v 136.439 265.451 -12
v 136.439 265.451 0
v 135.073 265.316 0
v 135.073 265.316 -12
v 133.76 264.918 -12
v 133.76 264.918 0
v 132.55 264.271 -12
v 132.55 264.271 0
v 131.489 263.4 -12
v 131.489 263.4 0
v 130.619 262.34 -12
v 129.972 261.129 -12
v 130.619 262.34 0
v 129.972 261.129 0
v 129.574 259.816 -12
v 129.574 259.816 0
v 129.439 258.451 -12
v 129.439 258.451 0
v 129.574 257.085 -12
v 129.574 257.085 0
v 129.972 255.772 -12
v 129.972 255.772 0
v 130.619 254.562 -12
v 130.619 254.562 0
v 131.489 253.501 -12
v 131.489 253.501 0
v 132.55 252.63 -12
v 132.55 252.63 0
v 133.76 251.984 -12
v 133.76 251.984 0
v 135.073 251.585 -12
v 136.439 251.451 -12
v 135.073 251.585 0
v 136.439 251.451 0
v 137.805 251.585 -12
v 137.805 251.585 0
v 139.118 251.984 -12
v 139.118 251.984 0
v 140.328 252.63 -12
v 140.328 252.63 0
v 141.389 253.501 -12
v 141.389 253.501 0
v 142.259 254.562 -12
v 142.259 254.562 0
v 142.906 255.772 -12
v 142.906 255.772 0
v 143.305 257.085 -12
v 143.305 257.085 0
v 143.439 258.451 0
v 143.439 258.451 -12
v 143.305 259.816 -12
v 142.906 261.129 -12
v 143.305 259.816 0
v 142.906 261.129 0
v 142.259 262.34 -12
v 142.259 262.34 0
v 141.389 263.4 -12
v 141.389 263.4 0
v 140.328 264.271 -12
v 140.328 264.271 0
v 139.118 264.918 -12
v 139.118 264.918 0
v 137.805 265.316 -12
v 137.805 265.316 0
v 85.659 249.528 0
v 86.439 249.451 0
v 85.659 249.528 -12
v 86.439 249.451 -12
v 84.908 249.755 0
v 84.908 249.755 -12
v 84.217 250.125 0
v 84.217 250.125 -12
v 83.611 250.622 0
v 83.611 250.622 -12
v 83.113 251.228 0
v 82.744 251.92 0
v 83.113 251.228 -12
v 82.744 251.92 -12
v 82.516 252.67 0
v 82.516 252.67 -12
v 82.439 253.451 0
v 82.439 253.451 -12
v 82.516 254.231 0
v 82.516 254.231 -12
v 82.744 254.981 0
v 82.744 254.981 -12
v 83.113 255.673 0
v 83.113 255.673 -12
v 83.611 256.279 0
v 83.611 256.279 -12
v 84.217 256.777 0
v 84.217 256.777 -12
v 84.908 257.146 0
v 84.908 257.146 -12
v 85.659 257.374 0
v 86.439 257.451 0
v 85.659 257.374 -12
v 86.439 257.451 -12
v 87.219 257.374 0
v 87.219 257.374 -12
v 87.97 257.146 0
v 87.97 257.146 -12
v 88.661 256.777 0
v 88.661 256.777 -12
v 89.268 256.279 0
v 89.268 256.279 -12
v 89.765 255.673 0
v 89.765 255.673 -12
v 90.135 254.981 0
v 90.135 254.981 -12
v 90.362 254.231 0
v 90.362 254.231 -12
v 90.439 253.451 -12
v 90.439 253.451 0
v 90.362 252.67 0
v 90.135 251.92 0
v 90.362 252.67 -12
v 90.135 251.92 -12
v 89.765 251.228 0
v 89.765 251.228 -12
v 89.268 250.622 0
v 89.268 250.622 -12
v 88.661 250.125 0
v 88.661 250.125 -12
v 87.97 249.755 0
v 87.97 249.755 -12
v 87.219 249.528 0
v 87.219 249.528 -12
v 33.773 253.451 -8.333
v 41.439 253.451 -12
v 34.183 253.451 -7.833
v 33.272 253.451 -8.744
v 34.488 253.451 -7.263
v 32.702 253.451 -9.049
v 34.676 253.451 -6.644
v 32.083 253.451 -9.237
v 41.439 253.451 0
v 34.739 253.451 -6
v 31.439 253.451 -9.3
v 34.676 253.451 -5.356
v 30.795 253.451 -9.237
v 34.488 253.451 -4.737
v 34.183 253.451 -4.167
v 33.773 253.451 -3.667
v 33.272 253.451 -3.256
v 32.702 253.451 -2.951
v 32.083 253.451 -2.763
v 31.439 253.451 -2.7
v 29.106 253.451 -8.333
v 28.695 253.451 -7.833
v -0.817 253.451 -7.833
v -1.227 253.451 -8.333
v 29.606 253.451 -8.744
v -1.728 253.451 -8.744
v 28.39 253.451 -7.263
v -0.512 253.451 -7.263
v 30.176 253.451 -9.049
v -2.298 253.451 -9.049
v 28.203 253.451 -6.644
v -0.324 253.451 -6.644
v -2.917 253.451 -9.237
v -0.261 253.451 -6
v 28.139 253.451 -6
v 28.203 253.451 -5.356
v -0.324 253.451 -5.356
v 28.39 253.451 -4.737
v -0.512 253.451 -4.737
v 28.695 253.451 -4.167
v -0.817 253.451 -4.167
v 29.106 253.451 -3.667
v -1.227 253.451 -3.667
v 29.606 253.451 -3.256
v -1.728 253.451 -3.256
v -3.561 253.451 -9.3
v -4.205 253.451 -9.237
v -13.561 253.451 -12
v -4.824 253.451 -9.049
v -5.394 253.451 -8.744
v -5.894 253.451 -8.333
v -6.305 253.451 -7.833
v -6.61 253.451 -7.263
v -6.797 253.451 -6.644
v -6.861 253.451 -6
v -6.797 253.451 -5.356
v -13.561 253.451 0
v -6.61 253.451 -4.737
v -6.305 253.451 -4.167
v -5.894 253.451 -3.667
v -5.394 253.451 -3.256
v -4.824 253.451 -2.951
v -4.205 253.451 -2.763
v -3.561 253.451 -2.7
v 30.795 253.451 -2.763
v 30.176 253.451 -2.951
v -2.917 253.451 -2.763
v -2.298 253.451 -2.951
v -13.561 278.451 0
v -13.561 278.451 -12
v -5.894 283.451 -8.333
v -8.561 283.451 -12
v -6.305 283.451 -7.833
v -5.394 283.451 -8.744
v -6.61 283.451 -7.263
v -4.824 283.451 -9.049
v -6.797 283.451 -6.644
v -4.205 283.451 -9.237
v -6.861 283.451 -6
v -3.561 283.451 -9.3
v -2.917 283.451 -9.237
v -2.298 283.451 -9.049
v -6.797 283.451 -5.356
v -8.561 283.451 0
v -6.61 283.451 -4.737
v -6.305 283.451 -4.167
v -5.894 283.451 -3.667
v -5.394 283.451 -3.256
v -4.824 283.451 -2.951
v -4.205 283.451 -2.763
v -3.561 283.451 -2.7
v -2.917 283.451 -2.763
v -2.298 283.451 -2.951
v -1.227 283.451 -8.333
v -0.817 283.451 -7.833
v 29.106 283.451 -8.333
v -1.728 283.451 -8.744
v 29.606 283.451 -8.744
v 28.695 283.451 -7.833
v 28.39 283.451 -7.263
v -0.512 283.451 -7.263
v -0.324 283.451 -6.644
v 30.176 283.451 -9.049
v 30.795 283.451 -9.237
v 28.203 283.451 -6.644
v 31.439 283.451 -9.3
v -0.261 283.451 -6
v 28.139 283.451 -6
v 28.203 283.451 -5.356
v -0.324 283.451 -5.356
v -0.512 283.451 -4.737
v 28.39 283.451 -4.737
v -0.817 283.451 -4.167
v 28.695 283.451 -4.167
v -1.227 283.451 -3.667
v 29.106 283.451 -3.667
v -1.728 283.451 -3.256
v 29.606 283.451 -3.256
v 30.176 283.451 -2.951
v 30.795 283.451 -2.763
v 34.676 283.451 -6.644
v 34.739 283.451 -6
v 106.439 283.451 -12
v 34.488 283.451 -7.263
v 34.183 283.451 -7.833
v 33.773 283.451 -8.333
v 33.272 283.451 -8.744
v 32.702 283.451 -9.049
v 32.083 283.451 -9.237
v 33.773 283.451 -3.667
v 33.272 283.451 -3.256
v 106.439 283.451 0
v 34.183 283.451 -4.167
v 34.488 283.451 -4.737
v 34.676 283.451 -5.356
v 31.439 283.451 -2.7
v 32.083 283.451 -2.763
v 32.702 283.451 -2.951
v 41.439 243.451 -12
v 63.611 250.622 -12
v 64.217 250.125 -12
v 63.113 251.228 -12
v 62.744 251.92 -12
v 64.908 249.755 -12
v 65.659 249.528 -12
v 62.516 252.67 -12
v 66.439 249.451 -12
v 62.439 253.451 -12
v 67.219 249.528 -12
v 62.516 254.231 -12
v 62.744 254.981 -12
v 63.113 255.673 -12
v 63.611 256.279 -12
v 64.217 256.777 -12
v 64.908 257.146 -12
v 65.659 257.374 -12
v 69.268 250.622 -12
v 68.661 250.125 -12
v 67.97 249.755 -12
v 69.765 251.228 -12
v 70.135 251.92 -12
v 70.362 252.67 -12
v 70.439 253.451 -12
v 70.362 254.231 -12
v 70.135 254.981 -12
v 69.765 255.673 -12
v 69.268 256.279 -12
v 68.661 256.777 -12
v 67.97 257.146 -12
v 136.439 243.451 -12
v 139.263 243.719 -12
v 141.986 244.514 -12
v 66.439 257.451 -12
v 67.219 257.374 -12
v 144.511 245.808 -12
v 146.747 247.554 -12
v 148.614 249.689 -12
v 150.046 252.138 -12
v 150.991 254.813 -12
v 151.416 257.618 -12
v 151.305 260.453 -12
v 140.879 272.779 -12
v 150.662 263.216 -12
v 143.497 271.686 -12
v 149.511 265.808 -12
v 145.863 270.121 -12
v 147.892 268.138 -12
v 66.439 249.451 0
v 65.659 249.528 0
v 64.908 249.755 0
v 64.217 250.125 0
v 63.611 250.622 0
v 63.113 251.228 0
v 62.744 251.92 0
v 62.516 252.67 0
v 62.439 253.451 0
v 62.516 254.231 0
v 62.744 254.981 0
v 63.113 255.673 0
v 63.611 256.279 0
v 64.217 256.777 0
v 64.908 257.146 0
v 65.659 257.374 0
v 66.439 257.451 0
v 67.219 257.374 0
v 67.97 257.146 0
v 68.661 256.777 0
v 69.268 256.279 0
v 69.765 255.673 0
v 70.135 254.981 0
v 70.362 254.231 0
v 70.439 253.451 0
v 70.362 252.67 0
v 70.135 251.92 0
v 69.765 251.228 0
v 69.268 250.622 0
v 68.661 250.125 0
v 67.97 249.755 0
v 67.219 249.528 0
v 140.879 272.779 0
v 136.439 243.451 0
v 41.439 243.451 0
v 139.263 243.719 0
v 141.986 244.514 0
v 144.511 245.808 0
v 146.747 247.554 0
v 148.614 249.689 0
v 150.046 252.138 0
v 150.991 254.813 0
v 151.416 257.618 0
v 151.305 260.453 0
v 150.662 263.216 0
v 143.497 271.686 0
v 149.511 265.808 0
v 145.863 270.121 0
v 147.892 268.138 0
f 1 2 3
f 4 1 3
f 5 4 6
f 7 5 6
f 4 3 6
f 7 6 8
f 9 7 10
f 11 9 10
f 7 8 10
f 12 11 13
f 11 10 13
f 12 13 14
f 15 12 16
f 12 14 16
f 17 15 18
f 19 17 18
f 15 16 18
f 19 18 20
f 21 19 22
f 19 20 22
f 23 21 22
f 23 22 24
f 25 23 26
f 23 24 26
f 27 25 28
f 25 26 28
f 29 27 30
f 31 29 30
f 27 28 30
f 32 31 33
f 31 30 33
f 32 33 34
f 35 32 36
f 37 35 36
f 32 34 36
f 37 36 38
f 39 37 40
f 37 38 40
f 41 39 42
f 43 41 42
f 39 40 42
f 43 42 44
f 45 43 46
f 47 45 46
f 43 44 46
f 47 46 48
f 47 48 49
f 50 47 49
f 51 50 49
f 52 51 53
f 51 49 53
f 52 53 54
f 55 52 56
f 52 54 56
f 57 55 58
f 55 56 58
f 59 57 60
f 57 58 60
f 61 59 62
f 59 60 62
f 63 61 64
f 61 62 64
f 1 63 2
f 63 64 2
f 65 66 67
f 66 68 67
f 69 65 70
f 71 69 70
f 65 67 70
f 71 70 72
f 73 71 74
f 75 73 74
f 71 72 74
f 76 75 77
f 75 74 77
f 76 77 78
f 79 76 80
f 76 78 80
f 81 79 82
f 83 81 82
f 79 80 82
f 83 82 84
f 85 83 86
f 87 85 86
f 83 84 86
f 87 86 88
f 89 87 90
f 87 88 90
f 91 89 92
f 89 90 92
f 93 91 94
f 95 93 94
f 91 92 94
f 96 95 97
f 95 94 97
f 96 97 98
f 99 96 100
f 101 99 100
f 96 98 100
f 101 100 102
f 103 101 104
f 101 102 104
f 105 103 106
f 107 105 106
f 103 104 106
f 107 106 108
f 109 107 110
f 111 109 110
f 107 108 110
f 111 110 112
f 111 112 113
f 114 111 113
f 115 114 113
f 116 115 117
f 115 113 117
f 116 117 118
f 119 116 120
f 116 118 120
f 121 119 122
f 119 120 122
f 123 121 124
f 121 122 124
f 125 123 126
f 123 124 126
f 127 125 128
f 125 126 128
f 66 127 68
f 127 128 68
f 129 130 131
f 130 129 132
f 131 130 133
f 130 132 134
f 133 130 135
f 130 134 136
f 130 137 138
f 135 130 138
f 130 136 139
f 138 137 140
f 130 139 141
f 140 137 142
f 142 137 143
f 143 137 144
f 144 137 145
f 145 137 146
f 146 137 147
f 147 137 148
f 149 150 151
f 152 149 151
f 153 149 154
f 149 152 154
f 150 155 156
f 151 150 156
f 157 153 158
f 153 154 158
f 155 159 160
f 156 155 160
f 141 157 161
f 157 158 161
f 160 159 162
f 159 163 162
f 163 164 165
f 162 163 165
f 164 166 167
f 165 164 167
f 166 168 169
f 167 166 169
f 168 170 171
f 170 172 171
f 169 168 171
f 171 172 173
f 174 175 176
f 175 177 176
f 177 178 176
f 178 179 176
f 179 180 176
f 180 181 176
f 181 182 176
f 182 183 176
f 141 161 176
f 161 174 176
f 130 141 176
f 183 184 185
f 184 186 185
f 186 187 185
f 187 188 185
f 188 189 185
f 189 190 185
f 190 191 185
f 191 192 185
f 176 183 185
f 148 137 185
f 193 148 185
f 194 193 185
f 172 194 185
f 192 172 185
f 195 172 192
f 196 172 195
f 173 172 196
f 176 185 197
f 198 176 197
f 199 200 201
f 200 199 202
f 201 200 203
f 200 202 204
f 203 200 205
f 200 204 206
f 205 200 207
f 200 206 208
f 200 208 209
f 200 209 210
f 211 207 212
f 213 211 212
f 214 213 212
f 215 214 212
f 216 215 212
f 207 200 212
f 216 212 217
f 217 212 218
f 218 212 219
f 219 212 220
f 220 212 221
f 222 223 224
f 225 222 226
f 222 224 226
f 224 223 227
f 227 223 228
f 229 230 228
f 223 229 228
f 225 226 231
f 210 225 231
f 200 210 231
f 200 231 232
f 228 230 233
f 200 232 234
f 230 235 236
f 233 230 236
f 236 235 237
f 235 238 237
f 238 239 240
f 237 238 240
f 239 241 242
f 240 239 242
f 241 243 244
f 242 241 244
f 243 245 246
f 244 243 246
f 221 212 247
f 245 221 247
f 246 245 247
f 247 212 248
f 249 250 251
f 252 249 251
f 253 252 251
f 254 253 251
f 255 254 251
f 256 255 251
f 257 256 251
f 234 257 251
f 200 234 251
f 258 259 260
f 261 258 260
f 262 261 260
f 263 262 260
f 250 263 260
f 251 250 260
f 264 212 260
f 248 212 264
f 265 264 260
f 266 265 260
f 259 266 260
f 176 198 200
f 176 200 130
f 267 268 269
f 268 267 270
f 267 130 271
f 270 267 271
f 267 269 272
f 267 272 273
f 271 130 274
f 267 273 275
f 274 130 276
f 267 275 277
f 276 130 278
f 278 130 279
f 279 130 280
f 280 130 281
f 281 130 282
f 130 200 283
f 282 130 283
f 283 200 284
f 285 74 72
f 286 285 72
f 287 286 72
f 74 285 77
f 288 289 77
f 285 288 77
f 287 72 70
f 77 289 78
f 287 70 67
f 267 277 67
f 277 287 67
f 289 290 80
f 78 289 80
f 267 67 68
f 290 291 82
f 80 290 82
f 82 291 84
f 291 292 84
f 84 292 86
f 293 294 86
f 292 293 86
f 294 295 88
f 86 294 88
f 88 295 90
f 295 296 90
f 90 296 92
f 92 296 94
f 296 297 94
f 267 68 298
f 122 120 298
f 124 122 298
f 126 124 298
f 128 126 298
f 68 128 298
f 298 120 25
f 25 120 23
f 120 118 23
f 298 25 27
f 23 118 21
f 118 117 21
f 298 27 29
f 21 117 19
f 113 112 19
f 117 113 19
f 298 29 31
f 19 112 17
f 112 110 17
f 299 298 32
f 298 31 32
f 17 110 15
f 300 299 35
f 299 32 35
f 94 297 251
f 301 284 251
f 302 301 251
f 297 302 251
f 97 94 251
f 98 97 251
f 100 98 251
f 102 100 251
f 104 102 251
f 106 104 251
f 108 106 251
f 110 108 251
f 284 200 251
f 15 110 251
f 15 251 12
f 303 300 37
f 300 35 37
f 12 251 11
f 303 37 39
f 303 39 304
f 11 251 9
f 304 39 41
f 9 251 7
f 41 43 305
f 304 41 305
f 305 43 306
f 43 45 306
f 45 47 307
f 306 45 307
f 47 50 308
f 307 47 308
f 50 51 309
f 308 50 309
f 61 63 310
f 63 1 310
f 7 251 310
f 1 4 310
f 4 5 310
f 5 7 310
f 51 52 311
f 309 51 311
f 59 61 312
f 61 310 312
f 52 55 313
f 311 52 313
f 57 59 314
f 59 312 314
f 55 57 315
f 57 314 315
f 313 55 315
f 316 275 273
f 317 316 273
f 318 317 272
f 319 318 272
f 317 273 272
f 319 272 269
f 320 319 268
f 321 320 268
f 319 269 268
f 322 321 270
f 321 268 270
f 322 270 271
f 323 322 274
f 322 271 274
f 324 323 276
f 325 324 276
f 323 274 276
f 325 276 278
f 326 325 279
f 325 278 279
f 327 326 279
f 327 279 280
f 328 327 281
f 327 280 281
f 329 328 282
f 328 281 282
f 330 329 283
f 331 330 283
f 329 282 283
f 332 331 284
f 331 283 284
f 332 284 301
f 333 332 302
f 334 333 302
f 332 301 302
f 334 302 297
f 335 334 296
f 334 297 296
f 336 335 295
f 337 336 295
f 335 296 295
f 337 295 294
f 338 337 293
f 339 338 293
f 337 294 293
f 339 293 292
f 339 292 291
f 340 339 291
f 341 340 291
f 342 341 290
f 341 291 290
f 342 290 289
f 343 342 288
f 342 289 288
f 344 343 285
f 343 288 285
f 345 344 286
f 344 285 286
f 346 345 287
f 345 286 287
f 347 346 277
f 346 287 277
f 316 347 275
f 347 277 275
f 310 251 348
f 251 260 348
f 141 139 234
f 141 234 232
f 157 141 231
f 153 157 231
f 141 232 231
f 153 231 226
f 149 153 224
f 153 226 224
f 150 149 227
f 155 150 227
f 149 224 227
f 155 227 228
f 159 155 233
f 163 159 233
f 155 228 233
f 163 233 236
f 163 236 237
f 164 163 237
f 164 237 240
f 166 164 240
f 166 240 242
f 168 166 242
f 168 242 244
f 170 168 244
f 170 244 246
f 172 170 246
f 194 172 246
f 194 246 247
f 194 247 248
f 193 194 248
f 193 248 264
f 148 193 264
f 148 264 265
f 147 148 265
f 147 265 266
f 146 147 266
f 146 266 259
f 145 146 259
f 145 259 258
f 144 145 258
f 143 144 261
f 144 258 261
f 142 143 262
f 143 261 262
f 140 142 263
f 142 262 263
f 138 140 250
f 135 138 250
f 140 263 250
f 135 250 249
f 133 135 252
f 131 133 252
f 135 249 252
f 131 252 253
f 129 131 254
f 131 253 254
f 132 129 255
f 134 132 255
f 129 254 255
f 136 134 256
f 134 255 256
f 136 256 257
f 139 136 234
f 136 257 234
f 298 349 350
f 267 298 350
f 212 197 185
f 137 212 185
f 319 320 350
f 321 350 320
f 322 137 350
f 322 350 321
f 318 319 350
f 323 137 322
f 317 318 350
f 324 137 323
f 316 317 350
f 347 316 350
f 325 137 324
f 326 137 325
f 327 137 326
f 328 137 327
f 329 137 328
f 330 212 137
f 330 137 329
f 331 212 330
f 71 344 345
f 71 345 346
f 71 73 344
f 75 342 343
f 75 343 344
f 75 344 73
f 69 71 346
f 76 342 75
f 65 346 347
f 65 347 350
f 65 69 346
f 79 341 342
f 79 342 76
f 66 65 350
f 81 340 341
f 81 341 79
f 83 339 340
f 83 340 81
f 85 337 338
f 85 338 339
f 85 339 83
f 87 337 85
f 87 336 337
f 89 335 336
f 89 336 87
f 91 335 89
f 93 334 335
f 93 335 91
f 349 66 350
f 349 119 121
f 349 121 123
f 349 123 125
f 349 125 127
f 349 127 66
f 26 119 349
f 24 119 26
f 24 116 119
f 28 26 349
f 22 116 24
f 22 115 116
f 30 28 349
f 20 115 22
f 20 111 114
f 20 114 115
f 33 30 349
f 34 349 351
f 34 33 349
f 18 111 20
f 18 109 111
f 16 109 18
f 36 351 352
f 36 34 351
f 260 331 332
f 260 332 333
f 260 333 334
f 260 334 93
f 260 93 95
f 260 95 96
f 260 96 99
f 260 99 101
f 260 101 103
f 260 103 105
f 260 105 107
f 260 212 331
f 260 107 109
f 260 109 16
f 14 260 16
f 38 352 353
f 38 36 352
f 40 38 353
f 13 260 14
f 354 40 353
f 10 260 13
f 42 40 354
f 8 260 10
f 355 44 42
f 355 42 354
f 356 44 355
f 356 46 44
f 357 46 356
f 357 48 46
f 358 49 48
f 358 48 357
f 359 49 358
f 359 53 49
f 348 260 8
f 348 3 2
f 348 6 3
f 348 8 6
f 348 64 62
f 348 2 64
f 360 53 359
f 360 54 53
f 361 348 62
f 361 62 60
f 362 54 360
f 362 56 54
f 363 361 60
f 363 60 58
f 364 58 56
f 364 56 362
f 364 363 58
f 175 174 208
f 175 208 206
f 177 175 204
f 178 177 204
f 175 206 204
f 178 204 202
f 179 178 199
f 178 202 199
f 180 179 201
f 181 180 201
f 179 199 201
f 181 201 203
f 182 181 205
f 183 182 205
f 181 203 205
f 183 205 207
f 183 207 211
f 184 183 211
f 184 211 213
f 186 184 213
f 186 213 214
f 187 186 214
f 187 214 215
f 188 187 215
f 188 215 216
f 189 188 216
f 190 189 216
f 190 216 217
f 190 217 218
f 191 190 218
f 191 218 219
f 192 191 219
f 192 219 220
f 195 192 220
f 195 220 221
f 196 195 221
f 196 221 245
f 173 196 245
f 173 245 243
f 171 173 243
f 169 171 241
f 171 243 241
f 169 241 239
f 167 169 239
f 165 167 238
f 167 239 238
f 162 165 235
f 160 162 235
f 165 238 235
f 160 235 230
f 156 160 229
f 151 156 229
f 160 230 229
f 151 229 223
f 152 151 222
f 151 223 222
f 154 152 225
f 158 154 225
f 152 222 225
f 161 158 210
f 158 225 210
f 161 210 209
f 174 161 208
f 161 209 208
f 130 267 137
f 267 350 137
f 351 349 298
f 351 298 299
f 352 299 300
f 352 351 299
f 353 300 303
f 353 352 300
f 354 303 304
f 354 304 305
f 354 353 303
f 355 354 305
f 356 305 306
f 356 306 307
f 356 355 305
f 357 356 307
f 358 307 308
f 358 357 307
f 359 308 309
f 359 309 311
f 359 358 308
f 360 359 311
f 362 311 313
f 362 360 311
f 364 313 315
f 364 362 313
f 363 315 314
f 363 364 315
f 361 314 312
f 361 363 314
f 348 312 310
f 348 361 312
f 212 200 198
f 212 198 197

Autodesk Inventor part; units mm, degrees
ref_plane "YZ Plane" through (0, 0, 0) normal (1, 0, 0) x (0, 1, 0)
ref_plane "XZ Plane" through (0, 0, 0) normal (0, 1, 0) x (-1, 0, 0)
sketch "スケッチ2" plane through (0, 0, 0) normal (0, 0, 1) x (1, 0, 0)
  line L0 (-13.5609, 243.4507) -> (-13.5609, 273.4507)
  line L1 (-13.5609, 273.4507) -> (136.4391, 273.4507)
  arc A0 (136.4391, 243.4507) -> (136.4391, 273.4507) centre (136.4391, 258.4507) ccw
  line L2 (136.4391, 243.4507) -> (-13.5609, 243.4507)
  point P0 (0, 0)
  dimension "d15" = 15
  dimension "d48" = 150
extrude "押し出し2" add sketch "スケッチ2" against normal blind 12
sketch "スケッチ3" plane through (0, 0, 0) normal (0, 0, 1) x (1, 0, 0)
  arc A0 (136.4391, 273.4507) -> (136.4391, 243.4507) centre (136.4391, 258.4507) ccw projected
  point P0 (86.4391, 253.4507)
  point P1 (66.4391, 253.4507)
  dimension "d4" = 20
  dimension "d5" = 50
  dimension "d6" = 5
hole "穴1" at (86.4391, 253.4507, 0) at (66.4391, 253.4507, 0) direction (0, 0, -1) diameter 8 end through all
sketch "スケッチ4" plane through (0, 0, -12) normal (0, 0, -1) x (-1, 0, 0)
  arc A0 (-136.4391, 273.4507) -> (-136.4391, 243.4507) centre (-136.4391, 258.4507) ccw projected
hole "穴2" at (136.4391, 258.4507, -12) direction (0, 0, 1) diameter 14 end through all
sketch "スケッチ7" plane through (0, 0, 0) normal (0, 0, 1) x (1, 0, 0)
  arc A0 (136.4391, 243.4507) -> (136.4391, 273.4507) centre (136.4391, 258.4507) ccw projected
  line L0 (136.4391, 273.4507) -> (-13.5609, 273.4507) projected
  line L1 (-13.5609, 243.4507) -> (136.4391, 243.4507) projected
  line L2 (-13.5609, 273.4507) -> (-13.5609, 283.4507)
  line L3 (-13.5609, 283.4507) -> (106.4391, 283.4507)
  line L4 (106.4391, 283.4507) -> (140.879, 272.7786)
  dimension "d49" = 10
  dimension "d50" = 120
extrude "押し出し3" add sketch "スケッチ7" against normal up to surface (12 mm away)
sketch "スケッチ8" plane through (0, 0, 0) normal (0, 0, 1) x (1, 0, 0)
  line L0 (-13.5609, 243.4507) -> (41.4391, 243.4507)
  line L1 (41.4391, 243.4507) -> (41.4391, 253.4507)
  line L2 (41.4391, 253.4507) -> (-13.5609, 253.4507)
  line L3 (-13.5609, 253.4507) -> (-13.5609, 243.4507)
  dimension "d53" = 10
  dimension "d54" = 55
extrude "押し出し4" cut sketch "スケッチ8" against normal through all
sketch "スケッチ9" plane through (-13.5609, 253.4507, 0) normal (0, -1, 0) x (1, 0, 0)
  line L0 (55, 0) -> (55, -12) projected
  line L1 (0, -12) -> (0, 0) projected
  line L2 (0, -6) -> (55, -6)
  point P0 (10, -6)
  point P1 (45, -6)
  dimension "d57" = 10
  dimension "d58" = 35
hole "穴5" at (-3.5609, 253.4507, -6) at (31.4391, 253.4507, -6) direction (0, 1, 0) diameter 6.6 end through all
chamfer "面取り1" distance 5 angle 45 1 edges at (-13.5609, 283.4507, -6)
ref_plane "Work Plane1" through (0, 0, -6) normal (0, 0, -1) x (-1, 0, 0)
properties part number "210-109c" material "STEEL - HIGH GRADE ALLOY"
